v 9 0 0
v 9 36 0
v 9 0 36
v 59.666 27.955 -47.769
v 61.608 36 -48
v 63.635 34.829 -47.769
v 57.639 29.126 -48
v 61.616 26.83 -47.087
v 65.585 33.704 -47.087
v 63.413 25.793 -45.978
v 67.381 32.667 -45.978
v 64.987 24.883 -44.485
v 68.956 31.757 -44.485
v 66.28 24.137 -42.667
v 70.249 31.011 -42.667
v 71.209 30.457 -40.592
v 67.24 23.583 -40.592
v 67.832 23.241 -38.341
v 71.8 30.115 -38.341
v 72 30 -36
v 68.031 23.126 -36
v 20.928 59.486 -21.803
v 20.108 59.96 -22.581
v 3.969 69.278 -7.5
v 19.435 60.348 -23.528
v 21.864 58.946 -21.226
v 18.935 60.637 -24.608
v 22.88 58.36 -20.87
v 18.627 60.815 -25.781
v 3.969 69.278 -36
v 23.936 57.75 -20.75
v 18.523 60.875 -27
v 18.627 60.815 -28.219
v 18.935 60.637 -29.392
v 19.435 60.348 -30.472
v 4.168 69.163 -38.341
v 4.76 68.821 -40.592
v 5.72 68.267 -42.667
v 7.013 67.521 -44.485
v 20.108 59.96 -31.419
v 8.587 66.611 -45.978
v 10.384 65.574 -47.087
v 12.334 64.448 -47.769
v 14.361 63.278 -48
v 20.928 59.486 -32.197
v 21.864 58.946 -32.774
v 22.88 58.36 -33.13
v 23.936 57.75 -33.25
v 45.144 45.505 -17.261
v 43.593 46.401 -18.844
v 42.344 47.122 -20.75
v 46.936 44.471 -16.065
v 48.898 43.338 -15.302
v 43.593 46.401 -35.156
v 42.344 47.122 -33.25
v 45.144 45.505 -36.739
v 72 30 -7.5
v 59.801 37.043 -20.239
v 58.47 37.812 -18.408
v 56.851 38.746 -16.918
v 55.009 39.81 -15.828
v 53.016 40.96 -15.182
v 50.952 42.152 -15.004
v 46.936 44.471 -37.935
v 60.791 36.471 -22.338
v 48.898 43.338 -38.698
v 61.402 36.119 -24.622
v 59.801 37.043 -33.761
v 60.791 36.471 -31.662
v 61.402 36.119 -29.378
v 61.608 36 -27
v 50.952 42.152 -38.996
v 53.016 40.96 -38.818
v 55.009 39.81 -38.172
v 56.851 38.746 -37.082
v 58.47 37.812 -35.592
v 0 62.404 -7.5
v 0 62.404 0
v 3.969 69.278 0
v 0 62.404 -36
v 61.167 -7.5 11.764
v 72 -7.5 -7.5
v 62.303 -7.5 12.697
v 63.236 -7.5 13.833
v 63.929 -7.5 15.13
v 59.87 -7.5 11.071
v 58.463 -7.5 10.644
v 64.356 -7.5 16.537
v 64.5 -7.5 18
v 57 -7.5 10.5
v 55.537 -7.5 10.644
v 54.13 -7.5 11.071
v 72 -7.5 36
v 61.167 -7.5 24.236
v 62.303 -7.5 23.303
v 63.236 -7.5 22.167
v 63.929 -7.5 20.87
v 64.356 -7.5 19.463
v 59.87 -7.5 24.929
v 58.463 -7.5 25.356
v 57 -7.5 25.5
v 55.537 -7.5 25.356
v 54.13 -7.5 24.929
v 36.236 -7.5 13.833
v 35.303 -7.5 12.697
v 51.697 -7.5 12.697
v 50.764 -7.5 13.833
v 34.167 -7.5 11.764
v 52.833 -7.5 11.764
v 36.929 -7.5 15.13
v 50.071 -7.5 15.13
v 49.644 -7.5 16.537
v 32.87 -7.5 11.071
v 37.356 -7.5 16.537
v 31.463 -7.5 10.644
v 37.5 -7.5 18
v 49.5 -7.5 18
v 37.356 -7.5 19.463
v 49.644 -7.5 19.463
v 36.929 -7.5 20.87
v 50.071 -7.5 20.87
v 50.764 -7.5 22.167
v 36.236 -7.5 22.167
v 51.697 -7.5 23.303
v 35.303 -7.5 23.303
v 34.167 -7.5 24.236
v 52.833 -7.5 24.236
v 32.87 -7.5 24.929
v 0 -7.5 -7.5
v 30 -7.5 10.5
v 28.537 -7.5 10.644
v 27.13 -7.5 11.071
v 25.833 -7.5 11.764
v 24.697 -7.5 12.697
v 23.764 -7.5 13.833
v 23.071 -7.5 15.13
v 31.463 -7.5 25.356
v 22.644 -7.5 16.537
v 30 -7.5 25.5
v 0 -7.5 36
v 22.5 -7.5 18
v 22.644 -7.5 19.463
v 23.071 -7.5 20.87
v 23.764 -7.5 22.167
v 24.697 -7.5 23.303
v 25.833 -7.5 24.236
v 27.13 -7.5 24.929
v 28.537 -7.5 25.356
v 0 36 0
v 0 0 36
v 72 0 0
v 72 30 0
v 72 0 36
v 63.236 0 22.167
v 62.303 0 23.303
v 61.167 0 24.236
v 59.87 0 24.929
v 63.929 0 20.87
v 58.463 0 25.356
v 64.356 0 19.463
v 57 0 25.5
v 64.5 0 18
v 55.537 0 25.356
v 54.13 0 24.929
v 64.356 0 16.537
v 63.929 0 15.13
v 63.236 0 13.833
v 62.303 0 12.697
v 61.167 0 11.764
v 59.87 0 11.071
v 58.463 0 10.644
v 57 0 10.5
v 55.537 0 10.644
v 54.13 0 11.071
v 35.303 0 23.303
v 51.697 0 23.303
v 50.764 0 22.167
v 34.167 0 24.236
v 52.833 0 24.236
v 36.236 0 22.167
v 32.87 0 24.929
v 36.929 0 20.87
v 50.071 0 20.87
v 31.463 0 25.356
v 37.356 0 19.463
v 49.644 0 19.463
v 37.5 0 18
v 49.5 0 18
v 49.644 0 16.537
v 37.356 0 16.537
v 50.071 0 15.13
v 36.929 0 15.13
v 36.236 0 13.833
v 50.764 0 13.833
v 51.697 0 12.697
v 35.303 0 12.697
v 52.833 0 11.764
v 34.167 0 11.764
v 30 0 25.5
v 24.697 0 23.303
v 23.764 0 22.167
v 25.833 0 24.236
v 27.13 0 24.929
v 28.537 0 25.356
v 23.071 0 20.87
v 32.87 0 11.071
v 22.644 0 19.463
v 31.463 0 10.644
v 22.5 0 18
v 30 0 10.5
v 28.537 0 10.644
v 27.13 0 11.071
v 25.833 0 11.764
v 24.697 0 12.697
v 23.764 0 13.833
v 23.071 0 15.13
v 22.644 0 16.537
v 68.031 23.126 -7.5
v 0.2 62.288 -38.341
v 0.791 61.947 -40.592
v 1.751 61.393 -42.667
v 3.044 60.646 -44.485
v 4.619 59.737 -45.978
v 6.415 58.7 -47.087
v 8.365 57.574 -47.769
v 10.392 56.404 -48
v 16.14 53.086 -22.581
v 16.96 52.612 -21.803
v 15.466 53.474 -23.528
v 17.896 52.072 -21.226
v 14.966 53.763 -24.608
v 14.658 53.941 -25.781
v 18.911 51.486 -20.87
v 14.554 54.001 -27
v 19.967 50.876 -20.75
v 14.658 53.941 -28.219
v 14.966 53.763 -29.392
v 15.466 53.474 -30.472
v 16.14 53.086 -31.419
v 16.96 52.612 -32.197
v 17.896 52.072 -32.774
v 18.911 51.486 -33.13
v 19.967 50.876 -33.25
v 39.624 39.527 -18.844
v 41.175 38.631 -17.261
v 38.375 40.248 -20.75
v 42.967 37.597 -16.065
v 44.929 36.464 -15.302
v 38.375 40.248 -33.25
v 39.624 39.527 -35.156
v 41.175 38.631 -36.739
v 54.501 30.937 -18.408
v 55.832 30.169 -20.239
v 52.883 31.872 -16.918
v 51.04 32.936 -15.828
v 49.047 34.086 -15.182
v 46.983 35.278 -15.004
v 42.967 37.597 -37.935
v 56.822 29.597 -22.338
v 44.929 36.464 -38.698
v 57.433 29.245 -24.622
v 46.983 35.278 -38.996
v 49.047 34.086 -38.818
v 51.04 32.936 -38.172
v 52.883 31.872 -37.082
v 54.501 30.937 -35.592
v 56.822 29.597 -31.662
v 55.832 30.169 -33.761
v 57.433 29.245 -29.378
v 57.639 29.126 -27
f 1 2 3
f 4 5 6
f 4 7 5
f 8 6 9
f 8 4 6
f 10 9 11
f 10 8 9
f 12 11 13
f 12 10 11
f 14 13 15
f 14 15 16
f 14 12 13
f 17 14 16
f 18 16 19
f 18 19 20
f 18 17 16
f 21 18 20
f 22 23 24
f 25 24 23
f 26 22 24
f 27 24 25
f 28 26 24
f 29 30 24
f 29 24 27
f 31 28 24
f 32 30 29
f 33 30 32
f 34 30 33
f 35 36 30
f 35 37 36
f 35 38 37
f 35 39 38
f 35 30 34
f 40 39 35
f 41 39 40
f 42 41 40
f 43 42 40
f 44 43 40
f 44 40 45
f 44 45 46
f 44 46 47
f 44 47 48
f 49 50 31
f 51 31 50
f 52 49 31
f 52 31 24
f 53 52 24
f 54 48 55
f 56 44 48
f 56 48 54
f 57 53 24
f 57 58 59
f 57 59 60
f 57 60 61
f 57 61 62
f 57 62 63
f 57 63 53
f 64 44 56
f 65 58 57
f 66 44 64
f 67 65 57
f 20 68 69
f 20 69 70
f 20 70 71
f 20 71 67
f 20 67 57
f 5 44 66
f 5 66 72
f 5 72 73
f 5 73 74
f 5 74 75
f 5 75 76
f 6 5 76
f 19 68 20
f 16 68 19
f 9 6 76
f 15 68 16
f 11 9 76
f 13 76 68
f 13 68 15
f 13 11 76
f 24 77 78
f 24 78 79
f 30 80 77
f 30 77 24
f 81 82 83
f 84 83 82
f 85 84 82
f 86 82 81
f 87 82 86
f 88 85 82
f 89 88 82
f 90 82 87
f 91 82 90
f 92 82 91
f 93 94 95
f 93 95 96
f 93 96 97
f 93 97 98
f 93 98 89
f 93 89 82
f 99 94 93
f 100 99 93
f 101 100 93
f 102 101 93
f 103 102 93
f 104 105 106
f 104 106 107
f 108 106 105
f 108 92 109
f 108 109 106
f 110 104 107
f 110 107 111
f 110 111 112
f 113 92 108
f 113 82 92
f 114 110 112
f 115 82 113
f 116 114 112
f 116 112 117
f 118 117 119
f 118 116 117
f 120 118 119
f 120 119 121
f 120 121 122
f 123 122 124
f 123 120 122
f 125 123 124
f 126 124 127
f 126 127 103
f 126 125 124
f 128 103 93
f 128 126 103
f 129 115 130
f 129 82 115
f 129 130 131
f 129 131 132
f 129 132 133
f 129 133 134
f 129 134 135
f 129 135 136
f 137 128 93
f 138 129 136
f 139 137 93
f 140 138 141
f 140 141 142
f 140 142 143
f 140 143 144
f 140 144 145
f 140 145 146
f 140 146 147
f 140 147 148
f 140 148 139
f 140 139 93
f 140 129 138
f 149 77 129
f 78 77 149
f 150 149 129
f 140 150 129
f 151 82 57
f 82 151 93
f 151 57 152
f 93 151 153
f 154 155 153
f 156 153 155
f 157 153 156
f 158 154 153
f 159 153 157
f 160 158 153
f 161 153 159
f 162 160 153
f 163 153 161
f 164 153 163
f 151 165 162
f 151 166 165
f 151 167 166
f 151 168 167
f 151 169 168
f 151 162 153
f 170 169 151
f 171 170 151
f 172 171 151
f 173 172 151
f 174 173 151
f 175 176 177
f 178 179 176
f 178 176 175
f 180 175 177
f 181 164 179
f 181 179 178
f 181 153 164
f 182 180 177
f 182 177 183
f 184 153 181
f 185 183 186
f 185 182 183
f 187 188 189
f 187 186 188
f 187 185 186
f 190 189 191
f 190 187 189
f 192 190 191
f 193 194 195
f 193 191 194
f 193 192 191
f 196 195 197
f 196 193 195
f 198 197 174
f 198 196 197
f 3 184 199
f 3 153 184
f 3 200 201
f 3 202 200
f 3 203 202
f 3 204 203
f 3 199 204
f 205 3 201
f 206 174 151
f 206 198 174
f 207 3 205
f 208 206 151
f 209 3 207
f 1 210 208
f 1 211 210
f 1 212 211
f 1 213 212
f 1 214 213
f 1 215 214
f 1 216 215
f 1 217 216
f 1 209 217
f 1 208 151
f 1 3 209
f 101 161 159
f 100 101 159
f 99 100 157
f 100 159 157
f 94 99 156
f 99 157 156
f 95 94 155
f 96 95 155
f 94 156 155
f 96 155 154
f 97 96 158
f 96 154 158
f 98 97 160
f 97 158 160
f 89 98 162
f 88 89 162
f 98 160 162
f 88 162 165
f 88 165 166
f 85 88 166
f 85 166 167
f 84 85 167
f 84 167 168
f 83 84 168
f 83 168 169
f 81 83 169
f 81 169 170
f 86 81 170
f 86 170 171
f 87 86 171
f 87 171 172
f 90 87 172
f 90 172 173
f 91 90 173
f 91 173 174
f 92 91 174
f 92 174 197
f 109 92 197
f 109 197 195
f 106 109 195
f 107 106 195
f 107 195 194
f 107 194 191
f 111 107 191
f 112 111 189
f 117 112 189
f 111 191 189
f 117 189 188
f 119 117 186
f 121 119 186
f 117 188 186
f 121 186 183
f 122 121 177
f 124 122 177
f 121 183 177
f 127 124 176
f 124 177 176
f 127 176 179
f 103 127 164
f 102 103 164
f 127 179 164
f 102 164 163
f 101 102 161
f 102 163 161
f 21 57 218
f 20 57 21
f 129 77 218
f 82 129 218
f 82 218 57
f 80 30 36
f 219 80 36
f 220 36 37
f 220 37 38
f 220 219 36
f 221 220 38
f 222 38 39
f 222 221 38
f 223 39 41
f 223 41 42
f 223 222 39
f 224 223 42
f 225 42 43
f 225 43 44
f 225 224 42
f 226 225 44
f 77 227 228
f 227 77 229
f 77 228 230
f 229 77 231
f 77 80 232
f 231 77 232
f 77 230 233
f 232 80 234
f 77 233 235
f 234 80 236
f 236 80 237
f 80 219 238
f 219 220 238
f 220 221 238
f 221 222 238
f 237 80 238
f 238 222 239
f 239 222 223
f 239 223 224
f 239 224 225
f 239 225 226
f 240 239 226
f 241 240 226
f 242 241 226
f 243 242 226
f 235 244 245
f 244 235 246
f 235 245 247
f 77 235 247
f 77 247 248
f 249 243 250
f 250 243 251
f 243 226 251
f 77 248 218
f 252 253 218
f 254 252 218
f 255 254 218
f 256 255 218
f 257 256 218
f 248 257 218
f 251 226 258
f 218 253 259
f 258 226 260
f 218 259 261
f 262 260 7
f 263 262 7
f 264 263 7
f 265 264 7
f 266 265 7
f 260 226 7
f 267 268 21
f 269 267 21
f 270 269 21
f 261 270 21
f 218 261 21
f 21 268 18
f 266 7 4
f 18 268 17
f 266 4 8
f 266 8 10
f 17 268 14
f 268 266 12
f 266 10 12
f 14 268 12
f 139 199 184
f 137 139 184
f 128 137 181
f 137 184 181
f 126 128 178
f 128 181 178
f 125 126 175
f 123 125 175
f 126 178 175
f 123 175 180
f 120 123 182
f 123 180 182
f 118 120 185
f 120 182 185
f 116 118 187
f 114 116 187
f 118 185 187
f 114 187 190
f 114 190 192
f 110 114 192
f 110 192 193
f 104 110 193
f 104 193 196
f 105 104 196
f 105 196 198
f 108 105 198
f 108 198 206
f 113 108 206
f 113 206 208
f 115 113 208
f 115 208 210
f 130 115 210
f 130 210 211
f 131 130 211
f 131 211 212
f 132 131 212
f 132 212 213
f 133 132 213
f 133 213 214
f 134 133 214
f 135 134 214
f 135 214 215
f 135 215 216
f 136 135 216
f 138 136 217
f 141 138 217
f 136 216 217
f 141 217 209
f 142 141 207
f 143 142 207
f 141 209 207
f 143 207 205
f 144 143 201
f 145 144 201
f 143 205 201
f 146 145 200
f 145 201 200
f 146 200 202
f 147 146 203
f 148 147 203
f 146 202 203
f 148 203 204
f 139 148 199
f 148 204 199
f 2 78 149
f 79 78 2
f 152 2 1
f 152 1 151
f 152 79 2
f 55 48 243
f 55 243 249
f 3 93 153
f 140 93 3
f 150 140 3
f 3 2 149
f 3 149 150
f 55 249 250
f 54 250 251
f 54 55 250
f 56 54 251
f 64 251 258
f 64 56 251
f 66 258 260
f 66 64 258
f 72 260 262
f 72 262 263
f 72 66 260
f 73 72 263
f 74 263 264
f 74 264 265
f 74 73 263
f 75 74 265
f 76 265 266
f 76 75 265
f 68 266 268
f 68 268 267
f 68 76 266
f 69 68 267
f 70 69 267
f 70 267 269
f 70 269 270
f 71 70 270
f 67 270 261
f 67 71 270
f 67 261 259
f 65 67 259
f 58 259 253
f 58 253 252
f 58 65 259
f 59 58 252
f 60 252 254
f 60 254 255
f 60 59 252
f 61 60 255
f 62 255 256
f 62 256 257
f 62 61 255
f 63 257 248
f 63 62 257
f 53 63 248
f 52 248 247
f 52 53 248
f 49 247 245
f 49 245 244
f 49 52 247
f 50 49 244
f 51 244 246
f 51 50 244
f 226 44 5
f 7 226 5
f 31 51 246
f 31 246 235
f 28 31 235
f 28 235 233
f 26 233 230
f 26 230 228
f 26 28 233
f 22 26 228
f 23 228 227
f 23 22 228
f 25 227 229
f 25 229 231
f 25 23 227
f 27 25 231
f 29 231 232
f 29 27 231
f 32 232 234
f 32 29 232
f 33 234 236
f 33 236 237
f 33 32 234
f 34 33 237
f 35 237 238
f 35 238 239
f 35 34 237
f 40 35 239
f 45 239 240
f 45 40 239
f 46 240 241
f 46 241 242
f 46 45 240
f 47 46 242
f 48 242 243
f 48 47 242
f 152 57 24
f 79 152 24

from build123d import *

# Parameters (mm, degrees)
EXTRUDE_1_DEPTH          = 72
EXTRUDE_START            = -7.5
EXTRUDE_1_2_DEPTH        = 7.5
SKETCH_3_W               = 83.138438763
SKETCH_3_H               = 48
EXTRUDE_2_DEPTH          = 7.9375
CUT_EXTRUDE_3_DEPTH      = 113.294938278
CUT_EXTRUDE_3_DEPTH_BACK = 113.294938278
FILLET_1_R               = 12
RIB_1_REACH              = 112.849
SKETCH_5_WALL_W          = 274.608976958
SKETCH_5_WALL_H          = 9
SKETCH_6_R               = 7.5
CUT_EXTRUDE_4_DEPTH      = 111.848644356


# Read off the part's stored shape, not the designer's step: 伸長1
with BuildPart() as part:
    # 草圖1 → Extrude 1 (new body)
    with BuildSketch(Plane(origin=(0, 0, 0), x_dir=(0, 0, -1), z_dir=(1, 0, 0))):
        Polygon((-36, 0), (0, 0), (0, 30), (7.5, 30), (7.5, -7.5), (-36, -7.5), align=None)
    extrude(amount=EXTRUDE_1_DEPTH)

    # Extrude 1 2 outline → Extrude 1 2 (add)
    with BuildSketch(Plane.XY.offset(EXTRUDE_START)):
        Polygon((72, 30), (0, 71.569219382), (0, 30), align=None)
    extrude(amount=EXTRUDE_1_2_DEPTH)

    # 草圖3 → 伸長2 (add)
    with BuildSketch(Plane(origin=(30.990381057, 53.676914536, 0), x_dir=(0.866025403784438, -0.5000000000000011, 0), z_dir=(0.5000000000000011, 0.8660254037844382, 0))):
        with Locations((5.784609691, 24)):
            Rectangle(SKETCH_3_W, SKETCH_3_H)
        with BuildLine():
            Line((-8.146170928, 33.25), (13.109928448, 33.25))
            ThreePointArc((13.109928448, 33.25), (35.353829072, 27), (13.109928448, 20.75))
            Line((13.109928448, 20.75), (-8.146170928, 20.75))
            ThreePointArc((-8.146170928, 20.75), (-14.396170928, 27), (-8.146170928, 33.25))
        make_face(mode=Mode.SUBTRACT)
    extrude(amount=-EXTRUDE_2_DEPTH)

    # 草圖4 → 伸長3 (cut, two sides: drawn at the far end of the back side and taken through both)
    with BuildSketch(Plane.XY.offset(-CUT_EXTRUDE_3_DEPTH_BACK)):
        Polygon((-110.576347035, -129.120067321), (0, 62.403783858), (8.212239163, 76.627799333), (118.788586198, 268.151650512), (-264.259116161, 489.304344581), (-493.624049393, 92.032626748), align=None)
    extrude(amount=CUT_EXTRUDE_3_DEPTH + CUT_EXTRUDE_3_DEPTH_BACK, mode=Mode.SUBTRACT)

    # 圓角1
    fillet_1_edges = [part.edges().sort_by_distance(p)[0] for p in [
        (70.015625, 26.562961679, -48),
        (1.984375, 65.84082218, -48),
    ]]
    fillet(fillet_1_edges, radius=FILLET_1_R)

    # 草圖5 wall → 肋材1 (add, up to next)
    with BuildSketch(Plane(origin=(0, 18, 18), x_dir=(0, -0.707106781187, 0.707106781187), z_dir=(0, 0.707106781187, 0.707106781187)), mode=Mode.PRIVATE) as rib_1_sk1:
        with Locations((0, 4.5)):
            Rectangle(SKETCH_5_WALL_W, SKETCH_5_WALL_H)
    rib_1_tool1 = extrude(rib_1_sk1.sketch, amount=-RIB_1_REACH, mode=Mode.PRIVATE) - part.part
    add(rib_1_tool1.solids().sort_by_distance((0, 18, 18))[0])

    # 草圖6 → 伸長4 (cut, through all)
    with BuildSketch(Plane(origin=(0, 0, 0), x_dir=(1, 0, 0), z_dir=(0, 1, 0))):
        with Locations(Location((57, -18, 0), (0, 0, 270))):
            Circle(SKETCH_6_R)
        with Locations(Location((30, -18, 0), (0, 0, 270))):
            Circle(SKETCH_6_R)
    extrude(amount=-CUT_EXTRUDE_4_DEPTH, mode=Mode.SUBTRACT)


solid = part.part
